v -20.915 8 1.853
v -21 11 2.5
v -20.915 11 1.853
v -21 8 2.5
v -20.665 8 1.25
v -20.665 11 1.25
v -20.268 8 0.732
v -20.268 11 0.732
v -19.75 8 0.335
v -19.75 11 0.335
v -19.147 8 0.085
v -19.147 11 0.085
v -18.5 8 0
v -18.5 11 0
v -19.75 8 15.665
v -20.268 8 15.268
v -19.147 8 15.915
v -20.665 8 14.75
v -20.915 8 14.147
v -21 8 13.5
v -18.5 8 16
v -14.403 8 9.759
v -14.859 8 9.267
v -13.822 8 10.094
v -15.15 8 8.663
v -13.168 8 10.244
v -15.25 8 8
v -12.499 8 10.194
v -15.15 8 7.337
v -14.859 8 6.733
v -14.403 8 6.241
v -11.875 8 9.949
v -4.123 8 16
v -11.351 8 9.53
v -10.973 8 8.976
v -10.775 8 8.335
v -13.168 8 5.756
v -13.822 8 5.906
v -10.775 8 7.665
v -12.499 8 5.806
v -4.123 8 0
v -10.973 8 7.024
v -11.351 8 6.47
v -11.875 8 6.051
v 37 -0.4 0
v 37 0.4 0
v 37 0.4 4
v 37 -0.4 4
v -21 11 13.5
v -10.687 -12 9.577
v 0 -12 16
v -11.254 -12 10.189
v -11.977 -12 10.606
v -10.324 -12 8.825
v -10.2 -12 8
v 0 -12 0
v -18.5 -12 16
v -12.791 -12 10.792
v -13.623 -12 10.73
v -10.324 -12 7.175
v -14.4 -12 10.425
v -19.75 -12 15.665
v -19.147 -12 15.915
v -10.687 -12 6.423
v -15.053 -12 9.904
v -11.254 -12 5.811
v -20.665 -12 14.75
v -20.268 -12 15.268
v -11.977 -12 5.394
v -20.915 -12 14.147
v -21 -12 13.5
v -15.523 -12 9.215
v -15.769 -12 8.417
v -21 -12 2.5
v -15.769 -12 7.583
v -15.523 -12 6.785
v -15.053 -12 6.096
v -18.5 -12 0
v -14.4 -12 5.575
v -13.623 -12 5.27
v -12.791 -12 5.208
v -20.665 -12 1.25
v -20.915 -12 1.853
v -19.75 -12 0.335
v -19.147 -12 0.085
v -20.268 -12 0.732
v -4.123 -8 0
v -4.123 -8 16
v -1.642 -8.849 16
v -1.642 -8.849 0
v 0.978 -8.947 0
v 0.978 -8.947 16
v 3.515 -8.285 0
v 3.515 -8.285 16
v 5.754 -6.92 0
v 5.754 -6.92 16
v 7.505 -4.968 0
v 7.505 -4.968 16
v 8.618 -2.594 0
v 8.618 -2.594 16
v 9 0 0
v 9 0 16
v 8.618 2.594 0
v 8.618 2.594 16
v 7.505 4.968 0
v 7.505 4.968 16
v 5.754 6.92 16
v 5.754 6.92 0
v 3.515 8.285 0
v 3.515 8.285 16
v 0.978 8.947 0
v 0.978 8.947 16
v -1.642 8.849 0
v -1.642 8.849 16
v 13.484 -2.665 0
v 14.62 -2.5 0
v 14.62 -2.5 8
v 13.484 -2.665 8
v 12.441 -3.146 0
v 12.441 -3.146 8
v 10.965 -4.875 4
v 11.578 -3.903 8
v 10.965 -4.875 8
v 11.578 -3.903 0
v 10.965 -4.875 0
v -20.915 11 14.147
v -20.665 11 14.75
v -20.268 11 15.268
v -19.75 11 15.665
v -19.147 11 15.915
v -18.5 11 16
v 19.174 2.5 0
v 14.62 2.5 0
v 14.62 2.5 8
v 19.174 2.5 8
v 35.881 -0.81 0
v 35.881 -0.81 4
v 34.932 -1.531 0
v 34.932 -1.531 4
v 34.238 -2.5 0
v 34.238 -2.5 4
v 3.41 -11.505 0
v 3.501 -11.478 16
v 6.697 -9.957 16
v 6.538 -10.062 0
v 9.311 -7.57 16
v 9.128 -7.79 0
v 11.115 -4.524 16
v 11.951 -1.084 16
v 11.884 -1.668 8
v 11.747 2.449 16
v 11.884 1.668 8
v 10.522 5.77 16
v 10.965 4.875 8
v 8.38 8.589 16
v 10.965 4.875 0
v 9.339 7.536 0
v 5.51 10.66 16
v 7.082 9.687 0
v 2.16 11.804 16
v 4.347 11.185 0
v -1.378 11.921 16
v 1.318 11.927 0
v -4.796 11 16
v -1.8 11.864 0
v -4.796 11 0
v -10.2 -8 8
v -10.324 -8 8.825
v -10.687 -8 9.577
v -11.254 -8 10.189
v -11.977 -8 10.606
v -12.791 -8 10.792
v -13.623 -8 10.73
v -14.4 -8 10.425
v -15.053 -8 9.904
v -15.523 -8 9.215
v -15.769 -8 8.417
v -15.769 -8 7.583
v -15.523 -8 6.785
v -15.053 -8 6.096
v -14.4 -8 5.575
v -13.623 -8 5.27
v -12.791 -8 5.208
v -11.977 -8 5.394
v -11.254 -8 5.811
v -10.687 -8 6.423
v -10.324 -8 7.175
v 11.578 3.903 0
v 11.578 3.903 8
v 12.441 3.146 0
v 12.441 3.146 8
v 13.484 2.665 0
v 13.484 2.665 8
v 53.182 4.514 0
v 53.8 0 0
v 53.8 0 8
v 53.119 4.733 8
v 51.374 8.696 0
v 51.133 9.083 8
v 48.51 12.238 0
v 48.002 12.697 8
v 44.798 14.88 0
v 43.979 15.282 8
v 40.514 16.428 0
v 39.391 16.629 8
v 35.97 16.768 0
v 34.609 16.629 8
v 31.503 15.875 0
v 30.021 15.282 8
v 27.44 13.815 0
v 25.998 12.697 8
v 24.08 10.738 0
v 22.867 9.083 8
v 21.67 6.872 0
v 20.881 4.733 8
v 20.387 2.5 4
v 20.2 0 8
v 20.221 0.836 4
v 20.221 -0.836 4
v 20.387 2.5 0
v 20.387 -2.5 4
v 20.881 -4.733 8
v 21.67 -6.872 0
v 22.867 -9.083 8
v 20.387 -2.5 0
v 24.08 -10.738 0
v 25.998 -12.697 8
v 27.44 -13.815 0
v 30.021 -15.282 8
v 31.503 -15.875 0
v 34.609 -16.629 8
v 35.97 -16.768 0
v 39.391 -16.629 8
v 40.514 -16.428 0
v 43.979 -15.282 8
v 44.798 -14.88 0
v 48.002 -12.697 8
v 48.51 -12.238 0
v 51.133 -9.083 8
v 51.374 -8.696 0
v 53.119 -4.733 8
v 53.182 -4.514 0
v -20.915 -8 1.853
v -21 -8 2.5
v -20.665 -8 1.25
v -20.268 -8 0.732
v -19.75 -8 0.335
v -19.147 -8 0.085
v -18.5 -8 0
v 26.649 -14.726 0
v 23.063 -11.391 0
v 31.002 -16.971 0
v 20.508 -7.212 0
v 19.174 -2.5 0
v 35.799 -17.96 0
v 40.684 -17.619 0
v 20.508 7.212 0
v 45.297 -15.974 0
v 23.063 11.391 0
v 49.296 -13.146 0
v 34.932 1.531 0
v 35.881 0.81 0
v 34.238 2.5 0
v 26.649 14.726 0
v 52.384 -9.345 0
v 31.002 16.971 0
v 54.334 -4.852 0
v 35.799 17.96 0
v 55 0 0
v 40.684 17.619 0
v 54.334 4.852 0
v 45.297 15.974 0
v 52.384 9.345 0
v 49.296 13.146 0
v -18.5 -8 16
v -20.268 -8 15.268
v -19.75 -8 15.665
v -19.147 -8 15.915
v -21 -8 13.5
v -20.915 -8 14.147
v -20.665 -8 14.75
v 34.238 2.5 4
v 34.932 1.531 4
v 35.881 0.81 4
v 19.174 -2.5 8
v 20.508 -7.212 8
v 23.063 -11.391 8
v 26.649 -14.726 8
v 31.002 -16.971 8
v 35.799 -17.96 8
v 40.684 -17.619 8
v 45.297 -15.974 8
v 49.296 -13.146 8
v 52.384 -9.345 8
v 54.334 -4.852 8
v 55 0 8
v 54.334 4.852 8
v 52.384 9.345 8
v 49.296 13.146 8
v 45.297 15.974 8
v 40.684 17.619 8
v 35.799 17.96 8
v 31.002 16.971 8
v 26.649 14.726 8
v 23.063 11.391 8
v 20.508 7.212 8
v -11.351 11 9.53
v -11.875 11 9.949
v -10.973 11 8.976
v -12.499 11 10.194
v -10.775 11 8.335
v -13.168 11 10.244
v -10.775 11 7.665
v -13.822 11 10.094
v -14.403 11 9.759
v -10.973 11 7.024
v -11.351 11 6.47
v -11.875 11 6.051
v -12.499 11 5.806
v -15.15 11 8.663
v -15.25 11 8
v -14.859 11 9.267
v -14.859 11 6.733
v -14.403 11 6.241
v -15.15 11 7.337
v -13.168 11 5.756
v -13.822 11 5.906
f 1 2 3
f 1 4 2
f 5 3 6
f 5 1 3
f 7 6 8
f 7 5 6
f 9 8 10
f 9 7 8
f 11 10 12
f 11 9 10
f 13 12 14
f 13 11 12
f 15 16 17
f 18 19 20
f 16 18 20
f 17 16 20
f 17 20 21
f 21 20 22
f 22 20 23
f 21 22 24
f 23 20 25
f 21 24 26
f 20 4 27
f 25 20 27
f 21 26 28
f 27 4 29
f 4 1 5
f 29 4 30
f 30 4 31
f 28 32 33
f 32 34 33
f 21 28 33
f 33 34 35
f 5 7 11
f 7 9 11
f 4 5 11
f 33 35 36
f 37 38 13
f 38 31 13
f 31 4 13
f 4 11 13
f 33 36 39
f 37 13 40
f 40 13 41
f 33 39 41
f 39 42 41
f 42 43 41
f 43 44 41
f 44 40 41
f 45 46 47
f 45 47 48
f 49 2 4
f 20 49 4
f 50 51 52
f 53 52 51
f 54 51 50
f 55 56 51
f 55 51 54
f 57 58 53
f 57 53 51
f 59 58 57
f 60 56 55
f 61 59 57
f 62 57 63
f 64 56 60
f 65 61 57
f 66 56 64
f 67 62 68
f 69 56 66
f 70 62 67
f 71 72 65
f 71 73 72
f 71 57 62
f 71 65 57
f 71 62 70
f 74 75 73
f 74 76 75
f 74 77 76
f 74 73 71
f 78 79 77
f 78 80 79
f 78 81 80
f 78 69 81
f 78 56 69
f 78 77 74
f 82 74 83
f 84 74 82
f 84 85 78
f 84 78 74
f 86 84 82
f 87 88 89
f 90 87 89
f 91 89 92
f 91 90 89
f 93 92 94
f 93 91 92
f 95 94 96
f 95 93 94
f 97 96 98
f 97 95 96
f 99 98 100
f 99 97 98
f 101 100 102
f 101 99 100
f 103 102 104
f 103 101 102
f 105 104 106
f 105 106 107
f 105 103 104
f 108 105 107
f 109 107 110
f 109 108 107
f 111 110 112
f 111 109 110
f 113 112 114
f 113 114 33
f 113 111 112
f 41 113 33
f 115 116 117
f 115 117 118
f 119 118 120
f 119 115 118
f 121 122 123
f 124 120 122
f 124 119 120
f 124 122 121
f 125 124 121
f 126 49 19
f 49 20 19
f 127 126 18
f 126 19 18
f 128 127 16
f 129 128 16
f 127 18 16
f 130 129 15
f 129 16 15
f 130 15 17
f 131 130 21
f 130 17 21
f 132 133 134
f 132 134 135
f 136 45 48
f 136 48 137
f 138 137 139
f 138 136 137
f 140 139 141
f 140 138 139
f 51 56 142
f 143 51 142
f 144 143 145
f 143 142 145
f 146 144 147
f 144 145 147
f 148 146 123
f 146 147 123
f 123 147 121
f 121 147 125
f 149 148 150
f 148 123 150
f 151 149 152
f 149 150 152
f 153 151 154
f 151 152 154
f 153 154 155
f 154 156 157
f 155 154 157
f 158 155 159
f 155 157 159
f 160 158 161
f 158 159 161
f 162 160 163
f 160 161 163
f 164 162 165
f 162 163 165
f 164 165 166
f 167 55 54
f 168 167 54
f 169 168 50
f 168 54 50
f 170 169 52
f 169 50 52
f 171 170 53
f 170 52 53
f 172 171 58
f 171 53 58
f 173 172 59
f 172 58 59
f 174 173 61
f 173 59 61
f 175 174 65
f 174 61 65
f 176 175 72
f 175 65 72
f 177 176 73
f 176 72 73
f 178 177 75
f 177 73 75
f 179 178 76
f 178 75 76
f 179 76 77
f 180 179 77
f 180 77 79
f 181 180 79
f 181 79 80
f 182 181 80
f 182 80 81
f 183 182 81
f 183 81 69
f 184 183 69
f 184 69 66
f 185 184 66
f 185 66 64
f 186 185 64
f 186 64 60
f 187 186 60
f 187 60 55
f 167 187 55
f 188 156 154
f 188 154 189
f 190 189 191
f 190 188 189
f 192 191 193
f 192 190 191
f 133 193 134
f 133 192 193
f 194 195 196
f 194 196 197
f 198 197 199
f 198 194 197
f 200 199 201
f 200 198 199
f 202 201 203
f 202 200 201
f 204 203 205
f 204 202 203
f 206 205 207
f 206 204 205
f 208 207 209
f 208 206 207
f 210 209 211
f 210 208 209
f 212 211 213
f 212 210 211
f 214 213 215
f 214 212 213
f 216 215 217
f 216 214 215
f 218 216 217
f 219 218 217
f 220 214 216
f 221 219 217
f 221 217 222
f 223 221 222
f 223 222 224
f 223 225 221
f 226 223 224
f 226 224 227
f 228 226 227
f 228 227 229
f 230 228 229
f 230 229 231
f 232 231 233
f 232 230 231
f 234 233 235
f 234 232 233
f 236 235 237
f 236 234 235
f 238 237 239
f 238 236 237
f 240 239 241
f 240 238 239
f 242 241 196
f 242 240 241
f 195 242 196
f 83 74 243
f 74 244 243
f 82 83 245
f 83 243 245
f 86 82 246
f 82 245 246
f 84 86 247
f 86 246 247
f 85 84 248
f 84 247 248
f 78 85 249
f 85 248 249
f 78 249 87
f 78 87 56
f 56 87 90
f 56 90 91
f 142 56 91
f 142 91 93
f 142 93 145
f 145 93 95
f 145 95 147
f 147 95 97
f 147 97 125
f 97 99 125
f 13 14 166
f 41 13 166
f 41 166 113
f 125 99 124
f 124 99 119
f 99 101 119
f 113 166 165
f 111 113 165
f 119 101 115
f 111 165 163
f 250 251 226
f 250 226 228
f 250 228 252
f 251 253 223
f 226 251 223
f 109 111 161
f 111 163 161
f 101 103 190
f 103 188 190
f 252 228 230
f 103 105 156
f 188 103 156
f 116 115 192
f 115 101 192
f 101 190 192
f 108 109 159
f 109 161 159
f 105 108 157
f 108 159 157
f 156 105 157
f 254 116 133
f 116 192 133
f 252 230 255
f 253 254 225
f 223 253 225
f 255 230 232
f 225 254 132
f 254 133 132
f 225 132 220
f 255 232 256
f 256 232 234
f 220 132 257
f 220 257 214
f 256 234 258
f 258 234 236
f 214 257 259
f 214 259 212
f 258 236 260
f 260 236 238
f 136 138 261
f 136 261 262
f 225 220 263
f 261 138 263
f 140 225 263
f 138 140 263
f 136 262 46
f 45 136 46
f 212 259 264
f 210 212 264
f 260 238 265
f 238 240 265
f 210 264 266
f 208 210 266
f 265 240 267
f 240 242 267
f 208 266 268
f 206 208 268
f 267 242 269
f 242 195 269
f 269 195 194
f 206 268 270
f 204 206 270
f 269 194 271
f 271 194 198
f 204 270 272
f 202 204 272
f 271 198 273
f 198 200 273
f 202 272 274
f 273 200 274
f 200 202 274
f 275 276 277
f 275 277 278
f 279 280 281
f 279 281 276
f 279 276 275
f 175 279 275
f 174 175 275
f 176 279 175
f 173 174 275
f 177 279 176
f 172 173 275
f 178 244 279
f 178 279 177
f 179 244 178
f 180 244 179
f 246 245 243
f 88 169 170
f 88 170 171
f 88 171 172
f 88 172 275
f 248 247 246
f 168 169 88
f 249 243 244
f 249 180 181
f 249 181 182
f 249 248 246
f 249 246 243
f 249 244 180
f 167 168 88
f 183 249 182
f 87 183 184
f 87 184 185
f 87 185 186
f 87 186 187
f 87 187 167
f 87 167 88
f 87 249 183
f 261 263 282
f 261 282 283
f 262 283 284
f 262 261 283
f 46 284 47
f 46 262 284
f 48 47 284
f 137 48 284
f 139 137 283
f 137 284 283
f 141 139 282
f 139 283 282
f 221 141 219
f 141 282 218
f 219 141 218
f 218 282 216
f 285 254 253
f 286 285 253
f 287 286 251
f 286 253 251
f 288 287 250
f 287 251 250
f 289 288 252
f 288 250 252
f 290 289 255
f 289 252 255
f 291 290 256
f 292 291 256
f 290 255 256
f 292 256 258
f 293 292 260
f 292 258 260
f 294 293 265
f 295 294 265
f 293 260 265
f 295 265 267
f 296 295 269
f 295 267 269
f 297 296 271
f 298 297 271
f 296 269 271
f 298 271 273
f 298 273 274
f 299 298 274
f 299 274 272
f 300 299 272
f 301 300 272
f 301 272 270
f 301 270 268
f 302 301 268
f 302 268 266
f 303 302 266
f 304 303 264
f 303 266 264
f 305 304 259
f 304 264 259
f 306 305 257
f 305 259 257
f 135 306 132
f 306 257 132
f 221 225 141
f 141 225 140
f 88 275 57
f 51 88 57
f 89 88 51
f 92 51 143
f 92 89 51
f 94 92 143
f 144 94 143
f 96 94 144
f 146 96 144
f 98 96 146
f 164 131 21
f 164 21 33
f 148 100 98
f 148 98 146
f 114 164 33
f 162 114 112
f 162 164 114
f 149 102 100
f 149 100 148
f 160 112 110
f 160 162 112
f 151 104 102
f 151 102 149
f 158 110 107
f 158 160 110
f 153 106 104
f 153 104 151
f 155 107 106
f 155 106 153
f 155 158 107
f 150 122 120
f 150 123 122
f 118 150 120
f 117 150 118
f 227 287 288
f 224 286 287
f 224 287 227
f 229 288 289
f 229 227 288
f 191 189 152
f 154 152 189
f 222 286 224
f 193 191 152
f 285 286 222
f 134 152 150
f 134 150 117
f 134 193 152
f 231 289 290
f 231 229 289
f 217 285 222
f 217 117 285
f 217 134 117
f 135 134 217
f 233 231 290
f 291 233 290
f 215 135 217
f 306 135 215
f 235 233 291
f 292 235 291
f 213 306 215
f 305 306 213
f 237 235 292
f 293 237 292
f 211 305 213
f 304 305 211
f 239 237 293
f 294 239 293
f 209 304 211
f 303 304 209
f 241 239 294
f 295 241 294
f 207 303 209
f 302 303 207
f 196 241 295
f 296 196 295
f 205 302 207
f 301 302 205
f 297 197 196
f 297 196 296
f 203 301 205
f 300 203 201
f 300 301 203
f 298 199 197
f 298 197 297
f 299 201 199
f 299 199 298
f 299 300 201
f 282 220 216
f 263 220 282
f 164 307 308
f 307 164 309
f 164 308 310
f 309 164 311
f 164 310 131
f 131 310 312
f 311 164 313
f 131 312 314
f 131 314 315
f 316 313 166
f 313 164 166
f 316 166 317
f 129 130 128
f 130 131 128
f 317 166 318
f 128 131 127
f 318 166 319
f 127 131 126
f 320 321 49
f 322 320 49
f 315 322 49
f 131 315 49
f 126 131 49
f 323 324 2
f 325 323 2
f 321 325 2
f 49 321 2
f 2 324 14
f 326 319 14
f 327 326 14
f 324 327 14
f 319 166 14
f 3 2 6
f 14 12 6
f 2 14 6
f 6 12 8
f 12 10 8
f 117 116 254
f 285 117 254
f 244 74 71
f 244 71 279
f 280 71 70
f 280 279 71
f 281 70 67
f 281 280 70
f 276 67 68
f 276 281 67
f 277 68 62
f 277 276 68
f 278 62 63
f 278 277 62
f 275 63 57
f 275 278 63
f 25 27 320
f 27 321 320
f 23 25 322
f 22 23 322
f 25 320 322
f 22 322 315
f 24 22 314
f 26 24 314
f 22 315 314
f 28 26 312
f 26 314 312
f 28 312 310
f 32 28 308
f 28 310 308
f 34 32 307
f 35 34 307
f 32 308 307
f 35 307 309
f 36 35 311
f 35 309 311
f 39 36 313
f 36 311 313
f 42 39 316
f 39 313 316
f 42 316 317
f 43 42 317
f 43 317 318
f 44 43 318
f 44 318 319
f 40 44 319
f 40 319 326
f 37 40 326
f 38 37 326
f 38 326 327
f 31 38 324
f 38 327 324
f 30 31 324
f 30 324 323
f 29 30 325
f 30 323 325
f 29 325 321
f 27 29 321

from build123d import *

# Parameters (mm, degrees)
PAD006_DEPTH        = 16
FILLET005_R         = 2.5
HOLE006_D           = 4.5
HOLE006_CBORE_D     = 5.6
HOLE006_CBORE_DEPTH = 4.4
PAD009_DEPTH        = 4
SKETCH027_R         = 16.8
PAD010_DEPTH        = 8


with BuildPart() as part:
    # Sketch023 → Pad006 (new body)
    with BuildSketch(Plane.XY):
        with BuildLine():
            Line((-4.795832, 11), (-21, 11))
            Line((-21, 11), (-21, 8))
            Line((-21, 8), (-4.123106, 8))
            ThreePointArc((-4.123106, -8), (9, 0), (-4.123106, 8))
            Line((-21, -8), (-4.123106, -8))
            Line((-21, -12), (-21, -8))
            Line((0, -12), (-21, -12))
            ThreePointArc((0, -12), (11.74734, 2.44949), (-4.795832, 11))
        make_face()
    extrude(amount=PAD006_DEPTH)

    # Fillet005
    fillet005_edges = [part.edges().sort_by_distance(p)[0] for p in [
        (-21, 9.5, 0),
        (-21, 9.5, 16),
        (-21, -10, 16),
        (-21, -10, 0),
    ]]
    fillet(fillet005_edges, radius=FILLET005_R)

    # Hole006 (through all)
    with Locations(Plane.XZ.offset(12)):
        with Locations((-13, 8)):
            CounterBoreHole(HOLE006_D / 2, HOLE006_CBORE_D / 2, HOLE006_CBORE_DEPTH)

    # Sketch028 → Pad009 (join)
    with BuildSketch(Plane.XY):
        with BuildLine():
            Line((14.620192, 2.5), (34.237617, 2.5))
            ThreePointArc((34.237617, 2.5), (35.379237, 1.134862), (37, 0.4))
            Line((37, 0.4), (37, -0.4))
            ThreePointArc((37, -0.4), (35.379237, -1.134862), (34.237617, -2.5))
            Line((14.620192, -2.5), (34.237617, -2.5))
            ThreePointArc((14.620192, -2.5), (12.440742, -3.145898), (10.965144, -4.875))
            Line((10.965144, 4.875), (10.965144, -4.875))
            ThreePointArc((10.965144, 4.875), (12.440742, 3.145898), (14.620192, 2.5))
        make_face()
    extrude(amount=PAD009_DEPTH)

    # Sketch027 → Pad010 (join)
    with BuildSketch(Plane.XY):
        with BuildLine():
            ThreePointArc((19.174457, -2.5), (55, 0), (19.174457, 2.5))
            Line((19.174457, 2.5), (14.620192, 2.5))
            ThreePointArc((10.965144, 4.875), (12.440742, 3.145898), (14.620192, 2.5))
            Line((10.965144, 4.875), (10.965144, -4.875))
            ThreePointArc((14.620192, -2.5), (12.440742, -3.145898), (10.965144, -4.875))
            Line((19.174457, -2.5), (14.620192, -2.5))
        make_face()
        with Locations((37, 0)):
            Circle(SKETCH027_R, mode=Mode.SUBTRACT)
    extrude(amount=PAD010_DEPTH)


solid = part.part
